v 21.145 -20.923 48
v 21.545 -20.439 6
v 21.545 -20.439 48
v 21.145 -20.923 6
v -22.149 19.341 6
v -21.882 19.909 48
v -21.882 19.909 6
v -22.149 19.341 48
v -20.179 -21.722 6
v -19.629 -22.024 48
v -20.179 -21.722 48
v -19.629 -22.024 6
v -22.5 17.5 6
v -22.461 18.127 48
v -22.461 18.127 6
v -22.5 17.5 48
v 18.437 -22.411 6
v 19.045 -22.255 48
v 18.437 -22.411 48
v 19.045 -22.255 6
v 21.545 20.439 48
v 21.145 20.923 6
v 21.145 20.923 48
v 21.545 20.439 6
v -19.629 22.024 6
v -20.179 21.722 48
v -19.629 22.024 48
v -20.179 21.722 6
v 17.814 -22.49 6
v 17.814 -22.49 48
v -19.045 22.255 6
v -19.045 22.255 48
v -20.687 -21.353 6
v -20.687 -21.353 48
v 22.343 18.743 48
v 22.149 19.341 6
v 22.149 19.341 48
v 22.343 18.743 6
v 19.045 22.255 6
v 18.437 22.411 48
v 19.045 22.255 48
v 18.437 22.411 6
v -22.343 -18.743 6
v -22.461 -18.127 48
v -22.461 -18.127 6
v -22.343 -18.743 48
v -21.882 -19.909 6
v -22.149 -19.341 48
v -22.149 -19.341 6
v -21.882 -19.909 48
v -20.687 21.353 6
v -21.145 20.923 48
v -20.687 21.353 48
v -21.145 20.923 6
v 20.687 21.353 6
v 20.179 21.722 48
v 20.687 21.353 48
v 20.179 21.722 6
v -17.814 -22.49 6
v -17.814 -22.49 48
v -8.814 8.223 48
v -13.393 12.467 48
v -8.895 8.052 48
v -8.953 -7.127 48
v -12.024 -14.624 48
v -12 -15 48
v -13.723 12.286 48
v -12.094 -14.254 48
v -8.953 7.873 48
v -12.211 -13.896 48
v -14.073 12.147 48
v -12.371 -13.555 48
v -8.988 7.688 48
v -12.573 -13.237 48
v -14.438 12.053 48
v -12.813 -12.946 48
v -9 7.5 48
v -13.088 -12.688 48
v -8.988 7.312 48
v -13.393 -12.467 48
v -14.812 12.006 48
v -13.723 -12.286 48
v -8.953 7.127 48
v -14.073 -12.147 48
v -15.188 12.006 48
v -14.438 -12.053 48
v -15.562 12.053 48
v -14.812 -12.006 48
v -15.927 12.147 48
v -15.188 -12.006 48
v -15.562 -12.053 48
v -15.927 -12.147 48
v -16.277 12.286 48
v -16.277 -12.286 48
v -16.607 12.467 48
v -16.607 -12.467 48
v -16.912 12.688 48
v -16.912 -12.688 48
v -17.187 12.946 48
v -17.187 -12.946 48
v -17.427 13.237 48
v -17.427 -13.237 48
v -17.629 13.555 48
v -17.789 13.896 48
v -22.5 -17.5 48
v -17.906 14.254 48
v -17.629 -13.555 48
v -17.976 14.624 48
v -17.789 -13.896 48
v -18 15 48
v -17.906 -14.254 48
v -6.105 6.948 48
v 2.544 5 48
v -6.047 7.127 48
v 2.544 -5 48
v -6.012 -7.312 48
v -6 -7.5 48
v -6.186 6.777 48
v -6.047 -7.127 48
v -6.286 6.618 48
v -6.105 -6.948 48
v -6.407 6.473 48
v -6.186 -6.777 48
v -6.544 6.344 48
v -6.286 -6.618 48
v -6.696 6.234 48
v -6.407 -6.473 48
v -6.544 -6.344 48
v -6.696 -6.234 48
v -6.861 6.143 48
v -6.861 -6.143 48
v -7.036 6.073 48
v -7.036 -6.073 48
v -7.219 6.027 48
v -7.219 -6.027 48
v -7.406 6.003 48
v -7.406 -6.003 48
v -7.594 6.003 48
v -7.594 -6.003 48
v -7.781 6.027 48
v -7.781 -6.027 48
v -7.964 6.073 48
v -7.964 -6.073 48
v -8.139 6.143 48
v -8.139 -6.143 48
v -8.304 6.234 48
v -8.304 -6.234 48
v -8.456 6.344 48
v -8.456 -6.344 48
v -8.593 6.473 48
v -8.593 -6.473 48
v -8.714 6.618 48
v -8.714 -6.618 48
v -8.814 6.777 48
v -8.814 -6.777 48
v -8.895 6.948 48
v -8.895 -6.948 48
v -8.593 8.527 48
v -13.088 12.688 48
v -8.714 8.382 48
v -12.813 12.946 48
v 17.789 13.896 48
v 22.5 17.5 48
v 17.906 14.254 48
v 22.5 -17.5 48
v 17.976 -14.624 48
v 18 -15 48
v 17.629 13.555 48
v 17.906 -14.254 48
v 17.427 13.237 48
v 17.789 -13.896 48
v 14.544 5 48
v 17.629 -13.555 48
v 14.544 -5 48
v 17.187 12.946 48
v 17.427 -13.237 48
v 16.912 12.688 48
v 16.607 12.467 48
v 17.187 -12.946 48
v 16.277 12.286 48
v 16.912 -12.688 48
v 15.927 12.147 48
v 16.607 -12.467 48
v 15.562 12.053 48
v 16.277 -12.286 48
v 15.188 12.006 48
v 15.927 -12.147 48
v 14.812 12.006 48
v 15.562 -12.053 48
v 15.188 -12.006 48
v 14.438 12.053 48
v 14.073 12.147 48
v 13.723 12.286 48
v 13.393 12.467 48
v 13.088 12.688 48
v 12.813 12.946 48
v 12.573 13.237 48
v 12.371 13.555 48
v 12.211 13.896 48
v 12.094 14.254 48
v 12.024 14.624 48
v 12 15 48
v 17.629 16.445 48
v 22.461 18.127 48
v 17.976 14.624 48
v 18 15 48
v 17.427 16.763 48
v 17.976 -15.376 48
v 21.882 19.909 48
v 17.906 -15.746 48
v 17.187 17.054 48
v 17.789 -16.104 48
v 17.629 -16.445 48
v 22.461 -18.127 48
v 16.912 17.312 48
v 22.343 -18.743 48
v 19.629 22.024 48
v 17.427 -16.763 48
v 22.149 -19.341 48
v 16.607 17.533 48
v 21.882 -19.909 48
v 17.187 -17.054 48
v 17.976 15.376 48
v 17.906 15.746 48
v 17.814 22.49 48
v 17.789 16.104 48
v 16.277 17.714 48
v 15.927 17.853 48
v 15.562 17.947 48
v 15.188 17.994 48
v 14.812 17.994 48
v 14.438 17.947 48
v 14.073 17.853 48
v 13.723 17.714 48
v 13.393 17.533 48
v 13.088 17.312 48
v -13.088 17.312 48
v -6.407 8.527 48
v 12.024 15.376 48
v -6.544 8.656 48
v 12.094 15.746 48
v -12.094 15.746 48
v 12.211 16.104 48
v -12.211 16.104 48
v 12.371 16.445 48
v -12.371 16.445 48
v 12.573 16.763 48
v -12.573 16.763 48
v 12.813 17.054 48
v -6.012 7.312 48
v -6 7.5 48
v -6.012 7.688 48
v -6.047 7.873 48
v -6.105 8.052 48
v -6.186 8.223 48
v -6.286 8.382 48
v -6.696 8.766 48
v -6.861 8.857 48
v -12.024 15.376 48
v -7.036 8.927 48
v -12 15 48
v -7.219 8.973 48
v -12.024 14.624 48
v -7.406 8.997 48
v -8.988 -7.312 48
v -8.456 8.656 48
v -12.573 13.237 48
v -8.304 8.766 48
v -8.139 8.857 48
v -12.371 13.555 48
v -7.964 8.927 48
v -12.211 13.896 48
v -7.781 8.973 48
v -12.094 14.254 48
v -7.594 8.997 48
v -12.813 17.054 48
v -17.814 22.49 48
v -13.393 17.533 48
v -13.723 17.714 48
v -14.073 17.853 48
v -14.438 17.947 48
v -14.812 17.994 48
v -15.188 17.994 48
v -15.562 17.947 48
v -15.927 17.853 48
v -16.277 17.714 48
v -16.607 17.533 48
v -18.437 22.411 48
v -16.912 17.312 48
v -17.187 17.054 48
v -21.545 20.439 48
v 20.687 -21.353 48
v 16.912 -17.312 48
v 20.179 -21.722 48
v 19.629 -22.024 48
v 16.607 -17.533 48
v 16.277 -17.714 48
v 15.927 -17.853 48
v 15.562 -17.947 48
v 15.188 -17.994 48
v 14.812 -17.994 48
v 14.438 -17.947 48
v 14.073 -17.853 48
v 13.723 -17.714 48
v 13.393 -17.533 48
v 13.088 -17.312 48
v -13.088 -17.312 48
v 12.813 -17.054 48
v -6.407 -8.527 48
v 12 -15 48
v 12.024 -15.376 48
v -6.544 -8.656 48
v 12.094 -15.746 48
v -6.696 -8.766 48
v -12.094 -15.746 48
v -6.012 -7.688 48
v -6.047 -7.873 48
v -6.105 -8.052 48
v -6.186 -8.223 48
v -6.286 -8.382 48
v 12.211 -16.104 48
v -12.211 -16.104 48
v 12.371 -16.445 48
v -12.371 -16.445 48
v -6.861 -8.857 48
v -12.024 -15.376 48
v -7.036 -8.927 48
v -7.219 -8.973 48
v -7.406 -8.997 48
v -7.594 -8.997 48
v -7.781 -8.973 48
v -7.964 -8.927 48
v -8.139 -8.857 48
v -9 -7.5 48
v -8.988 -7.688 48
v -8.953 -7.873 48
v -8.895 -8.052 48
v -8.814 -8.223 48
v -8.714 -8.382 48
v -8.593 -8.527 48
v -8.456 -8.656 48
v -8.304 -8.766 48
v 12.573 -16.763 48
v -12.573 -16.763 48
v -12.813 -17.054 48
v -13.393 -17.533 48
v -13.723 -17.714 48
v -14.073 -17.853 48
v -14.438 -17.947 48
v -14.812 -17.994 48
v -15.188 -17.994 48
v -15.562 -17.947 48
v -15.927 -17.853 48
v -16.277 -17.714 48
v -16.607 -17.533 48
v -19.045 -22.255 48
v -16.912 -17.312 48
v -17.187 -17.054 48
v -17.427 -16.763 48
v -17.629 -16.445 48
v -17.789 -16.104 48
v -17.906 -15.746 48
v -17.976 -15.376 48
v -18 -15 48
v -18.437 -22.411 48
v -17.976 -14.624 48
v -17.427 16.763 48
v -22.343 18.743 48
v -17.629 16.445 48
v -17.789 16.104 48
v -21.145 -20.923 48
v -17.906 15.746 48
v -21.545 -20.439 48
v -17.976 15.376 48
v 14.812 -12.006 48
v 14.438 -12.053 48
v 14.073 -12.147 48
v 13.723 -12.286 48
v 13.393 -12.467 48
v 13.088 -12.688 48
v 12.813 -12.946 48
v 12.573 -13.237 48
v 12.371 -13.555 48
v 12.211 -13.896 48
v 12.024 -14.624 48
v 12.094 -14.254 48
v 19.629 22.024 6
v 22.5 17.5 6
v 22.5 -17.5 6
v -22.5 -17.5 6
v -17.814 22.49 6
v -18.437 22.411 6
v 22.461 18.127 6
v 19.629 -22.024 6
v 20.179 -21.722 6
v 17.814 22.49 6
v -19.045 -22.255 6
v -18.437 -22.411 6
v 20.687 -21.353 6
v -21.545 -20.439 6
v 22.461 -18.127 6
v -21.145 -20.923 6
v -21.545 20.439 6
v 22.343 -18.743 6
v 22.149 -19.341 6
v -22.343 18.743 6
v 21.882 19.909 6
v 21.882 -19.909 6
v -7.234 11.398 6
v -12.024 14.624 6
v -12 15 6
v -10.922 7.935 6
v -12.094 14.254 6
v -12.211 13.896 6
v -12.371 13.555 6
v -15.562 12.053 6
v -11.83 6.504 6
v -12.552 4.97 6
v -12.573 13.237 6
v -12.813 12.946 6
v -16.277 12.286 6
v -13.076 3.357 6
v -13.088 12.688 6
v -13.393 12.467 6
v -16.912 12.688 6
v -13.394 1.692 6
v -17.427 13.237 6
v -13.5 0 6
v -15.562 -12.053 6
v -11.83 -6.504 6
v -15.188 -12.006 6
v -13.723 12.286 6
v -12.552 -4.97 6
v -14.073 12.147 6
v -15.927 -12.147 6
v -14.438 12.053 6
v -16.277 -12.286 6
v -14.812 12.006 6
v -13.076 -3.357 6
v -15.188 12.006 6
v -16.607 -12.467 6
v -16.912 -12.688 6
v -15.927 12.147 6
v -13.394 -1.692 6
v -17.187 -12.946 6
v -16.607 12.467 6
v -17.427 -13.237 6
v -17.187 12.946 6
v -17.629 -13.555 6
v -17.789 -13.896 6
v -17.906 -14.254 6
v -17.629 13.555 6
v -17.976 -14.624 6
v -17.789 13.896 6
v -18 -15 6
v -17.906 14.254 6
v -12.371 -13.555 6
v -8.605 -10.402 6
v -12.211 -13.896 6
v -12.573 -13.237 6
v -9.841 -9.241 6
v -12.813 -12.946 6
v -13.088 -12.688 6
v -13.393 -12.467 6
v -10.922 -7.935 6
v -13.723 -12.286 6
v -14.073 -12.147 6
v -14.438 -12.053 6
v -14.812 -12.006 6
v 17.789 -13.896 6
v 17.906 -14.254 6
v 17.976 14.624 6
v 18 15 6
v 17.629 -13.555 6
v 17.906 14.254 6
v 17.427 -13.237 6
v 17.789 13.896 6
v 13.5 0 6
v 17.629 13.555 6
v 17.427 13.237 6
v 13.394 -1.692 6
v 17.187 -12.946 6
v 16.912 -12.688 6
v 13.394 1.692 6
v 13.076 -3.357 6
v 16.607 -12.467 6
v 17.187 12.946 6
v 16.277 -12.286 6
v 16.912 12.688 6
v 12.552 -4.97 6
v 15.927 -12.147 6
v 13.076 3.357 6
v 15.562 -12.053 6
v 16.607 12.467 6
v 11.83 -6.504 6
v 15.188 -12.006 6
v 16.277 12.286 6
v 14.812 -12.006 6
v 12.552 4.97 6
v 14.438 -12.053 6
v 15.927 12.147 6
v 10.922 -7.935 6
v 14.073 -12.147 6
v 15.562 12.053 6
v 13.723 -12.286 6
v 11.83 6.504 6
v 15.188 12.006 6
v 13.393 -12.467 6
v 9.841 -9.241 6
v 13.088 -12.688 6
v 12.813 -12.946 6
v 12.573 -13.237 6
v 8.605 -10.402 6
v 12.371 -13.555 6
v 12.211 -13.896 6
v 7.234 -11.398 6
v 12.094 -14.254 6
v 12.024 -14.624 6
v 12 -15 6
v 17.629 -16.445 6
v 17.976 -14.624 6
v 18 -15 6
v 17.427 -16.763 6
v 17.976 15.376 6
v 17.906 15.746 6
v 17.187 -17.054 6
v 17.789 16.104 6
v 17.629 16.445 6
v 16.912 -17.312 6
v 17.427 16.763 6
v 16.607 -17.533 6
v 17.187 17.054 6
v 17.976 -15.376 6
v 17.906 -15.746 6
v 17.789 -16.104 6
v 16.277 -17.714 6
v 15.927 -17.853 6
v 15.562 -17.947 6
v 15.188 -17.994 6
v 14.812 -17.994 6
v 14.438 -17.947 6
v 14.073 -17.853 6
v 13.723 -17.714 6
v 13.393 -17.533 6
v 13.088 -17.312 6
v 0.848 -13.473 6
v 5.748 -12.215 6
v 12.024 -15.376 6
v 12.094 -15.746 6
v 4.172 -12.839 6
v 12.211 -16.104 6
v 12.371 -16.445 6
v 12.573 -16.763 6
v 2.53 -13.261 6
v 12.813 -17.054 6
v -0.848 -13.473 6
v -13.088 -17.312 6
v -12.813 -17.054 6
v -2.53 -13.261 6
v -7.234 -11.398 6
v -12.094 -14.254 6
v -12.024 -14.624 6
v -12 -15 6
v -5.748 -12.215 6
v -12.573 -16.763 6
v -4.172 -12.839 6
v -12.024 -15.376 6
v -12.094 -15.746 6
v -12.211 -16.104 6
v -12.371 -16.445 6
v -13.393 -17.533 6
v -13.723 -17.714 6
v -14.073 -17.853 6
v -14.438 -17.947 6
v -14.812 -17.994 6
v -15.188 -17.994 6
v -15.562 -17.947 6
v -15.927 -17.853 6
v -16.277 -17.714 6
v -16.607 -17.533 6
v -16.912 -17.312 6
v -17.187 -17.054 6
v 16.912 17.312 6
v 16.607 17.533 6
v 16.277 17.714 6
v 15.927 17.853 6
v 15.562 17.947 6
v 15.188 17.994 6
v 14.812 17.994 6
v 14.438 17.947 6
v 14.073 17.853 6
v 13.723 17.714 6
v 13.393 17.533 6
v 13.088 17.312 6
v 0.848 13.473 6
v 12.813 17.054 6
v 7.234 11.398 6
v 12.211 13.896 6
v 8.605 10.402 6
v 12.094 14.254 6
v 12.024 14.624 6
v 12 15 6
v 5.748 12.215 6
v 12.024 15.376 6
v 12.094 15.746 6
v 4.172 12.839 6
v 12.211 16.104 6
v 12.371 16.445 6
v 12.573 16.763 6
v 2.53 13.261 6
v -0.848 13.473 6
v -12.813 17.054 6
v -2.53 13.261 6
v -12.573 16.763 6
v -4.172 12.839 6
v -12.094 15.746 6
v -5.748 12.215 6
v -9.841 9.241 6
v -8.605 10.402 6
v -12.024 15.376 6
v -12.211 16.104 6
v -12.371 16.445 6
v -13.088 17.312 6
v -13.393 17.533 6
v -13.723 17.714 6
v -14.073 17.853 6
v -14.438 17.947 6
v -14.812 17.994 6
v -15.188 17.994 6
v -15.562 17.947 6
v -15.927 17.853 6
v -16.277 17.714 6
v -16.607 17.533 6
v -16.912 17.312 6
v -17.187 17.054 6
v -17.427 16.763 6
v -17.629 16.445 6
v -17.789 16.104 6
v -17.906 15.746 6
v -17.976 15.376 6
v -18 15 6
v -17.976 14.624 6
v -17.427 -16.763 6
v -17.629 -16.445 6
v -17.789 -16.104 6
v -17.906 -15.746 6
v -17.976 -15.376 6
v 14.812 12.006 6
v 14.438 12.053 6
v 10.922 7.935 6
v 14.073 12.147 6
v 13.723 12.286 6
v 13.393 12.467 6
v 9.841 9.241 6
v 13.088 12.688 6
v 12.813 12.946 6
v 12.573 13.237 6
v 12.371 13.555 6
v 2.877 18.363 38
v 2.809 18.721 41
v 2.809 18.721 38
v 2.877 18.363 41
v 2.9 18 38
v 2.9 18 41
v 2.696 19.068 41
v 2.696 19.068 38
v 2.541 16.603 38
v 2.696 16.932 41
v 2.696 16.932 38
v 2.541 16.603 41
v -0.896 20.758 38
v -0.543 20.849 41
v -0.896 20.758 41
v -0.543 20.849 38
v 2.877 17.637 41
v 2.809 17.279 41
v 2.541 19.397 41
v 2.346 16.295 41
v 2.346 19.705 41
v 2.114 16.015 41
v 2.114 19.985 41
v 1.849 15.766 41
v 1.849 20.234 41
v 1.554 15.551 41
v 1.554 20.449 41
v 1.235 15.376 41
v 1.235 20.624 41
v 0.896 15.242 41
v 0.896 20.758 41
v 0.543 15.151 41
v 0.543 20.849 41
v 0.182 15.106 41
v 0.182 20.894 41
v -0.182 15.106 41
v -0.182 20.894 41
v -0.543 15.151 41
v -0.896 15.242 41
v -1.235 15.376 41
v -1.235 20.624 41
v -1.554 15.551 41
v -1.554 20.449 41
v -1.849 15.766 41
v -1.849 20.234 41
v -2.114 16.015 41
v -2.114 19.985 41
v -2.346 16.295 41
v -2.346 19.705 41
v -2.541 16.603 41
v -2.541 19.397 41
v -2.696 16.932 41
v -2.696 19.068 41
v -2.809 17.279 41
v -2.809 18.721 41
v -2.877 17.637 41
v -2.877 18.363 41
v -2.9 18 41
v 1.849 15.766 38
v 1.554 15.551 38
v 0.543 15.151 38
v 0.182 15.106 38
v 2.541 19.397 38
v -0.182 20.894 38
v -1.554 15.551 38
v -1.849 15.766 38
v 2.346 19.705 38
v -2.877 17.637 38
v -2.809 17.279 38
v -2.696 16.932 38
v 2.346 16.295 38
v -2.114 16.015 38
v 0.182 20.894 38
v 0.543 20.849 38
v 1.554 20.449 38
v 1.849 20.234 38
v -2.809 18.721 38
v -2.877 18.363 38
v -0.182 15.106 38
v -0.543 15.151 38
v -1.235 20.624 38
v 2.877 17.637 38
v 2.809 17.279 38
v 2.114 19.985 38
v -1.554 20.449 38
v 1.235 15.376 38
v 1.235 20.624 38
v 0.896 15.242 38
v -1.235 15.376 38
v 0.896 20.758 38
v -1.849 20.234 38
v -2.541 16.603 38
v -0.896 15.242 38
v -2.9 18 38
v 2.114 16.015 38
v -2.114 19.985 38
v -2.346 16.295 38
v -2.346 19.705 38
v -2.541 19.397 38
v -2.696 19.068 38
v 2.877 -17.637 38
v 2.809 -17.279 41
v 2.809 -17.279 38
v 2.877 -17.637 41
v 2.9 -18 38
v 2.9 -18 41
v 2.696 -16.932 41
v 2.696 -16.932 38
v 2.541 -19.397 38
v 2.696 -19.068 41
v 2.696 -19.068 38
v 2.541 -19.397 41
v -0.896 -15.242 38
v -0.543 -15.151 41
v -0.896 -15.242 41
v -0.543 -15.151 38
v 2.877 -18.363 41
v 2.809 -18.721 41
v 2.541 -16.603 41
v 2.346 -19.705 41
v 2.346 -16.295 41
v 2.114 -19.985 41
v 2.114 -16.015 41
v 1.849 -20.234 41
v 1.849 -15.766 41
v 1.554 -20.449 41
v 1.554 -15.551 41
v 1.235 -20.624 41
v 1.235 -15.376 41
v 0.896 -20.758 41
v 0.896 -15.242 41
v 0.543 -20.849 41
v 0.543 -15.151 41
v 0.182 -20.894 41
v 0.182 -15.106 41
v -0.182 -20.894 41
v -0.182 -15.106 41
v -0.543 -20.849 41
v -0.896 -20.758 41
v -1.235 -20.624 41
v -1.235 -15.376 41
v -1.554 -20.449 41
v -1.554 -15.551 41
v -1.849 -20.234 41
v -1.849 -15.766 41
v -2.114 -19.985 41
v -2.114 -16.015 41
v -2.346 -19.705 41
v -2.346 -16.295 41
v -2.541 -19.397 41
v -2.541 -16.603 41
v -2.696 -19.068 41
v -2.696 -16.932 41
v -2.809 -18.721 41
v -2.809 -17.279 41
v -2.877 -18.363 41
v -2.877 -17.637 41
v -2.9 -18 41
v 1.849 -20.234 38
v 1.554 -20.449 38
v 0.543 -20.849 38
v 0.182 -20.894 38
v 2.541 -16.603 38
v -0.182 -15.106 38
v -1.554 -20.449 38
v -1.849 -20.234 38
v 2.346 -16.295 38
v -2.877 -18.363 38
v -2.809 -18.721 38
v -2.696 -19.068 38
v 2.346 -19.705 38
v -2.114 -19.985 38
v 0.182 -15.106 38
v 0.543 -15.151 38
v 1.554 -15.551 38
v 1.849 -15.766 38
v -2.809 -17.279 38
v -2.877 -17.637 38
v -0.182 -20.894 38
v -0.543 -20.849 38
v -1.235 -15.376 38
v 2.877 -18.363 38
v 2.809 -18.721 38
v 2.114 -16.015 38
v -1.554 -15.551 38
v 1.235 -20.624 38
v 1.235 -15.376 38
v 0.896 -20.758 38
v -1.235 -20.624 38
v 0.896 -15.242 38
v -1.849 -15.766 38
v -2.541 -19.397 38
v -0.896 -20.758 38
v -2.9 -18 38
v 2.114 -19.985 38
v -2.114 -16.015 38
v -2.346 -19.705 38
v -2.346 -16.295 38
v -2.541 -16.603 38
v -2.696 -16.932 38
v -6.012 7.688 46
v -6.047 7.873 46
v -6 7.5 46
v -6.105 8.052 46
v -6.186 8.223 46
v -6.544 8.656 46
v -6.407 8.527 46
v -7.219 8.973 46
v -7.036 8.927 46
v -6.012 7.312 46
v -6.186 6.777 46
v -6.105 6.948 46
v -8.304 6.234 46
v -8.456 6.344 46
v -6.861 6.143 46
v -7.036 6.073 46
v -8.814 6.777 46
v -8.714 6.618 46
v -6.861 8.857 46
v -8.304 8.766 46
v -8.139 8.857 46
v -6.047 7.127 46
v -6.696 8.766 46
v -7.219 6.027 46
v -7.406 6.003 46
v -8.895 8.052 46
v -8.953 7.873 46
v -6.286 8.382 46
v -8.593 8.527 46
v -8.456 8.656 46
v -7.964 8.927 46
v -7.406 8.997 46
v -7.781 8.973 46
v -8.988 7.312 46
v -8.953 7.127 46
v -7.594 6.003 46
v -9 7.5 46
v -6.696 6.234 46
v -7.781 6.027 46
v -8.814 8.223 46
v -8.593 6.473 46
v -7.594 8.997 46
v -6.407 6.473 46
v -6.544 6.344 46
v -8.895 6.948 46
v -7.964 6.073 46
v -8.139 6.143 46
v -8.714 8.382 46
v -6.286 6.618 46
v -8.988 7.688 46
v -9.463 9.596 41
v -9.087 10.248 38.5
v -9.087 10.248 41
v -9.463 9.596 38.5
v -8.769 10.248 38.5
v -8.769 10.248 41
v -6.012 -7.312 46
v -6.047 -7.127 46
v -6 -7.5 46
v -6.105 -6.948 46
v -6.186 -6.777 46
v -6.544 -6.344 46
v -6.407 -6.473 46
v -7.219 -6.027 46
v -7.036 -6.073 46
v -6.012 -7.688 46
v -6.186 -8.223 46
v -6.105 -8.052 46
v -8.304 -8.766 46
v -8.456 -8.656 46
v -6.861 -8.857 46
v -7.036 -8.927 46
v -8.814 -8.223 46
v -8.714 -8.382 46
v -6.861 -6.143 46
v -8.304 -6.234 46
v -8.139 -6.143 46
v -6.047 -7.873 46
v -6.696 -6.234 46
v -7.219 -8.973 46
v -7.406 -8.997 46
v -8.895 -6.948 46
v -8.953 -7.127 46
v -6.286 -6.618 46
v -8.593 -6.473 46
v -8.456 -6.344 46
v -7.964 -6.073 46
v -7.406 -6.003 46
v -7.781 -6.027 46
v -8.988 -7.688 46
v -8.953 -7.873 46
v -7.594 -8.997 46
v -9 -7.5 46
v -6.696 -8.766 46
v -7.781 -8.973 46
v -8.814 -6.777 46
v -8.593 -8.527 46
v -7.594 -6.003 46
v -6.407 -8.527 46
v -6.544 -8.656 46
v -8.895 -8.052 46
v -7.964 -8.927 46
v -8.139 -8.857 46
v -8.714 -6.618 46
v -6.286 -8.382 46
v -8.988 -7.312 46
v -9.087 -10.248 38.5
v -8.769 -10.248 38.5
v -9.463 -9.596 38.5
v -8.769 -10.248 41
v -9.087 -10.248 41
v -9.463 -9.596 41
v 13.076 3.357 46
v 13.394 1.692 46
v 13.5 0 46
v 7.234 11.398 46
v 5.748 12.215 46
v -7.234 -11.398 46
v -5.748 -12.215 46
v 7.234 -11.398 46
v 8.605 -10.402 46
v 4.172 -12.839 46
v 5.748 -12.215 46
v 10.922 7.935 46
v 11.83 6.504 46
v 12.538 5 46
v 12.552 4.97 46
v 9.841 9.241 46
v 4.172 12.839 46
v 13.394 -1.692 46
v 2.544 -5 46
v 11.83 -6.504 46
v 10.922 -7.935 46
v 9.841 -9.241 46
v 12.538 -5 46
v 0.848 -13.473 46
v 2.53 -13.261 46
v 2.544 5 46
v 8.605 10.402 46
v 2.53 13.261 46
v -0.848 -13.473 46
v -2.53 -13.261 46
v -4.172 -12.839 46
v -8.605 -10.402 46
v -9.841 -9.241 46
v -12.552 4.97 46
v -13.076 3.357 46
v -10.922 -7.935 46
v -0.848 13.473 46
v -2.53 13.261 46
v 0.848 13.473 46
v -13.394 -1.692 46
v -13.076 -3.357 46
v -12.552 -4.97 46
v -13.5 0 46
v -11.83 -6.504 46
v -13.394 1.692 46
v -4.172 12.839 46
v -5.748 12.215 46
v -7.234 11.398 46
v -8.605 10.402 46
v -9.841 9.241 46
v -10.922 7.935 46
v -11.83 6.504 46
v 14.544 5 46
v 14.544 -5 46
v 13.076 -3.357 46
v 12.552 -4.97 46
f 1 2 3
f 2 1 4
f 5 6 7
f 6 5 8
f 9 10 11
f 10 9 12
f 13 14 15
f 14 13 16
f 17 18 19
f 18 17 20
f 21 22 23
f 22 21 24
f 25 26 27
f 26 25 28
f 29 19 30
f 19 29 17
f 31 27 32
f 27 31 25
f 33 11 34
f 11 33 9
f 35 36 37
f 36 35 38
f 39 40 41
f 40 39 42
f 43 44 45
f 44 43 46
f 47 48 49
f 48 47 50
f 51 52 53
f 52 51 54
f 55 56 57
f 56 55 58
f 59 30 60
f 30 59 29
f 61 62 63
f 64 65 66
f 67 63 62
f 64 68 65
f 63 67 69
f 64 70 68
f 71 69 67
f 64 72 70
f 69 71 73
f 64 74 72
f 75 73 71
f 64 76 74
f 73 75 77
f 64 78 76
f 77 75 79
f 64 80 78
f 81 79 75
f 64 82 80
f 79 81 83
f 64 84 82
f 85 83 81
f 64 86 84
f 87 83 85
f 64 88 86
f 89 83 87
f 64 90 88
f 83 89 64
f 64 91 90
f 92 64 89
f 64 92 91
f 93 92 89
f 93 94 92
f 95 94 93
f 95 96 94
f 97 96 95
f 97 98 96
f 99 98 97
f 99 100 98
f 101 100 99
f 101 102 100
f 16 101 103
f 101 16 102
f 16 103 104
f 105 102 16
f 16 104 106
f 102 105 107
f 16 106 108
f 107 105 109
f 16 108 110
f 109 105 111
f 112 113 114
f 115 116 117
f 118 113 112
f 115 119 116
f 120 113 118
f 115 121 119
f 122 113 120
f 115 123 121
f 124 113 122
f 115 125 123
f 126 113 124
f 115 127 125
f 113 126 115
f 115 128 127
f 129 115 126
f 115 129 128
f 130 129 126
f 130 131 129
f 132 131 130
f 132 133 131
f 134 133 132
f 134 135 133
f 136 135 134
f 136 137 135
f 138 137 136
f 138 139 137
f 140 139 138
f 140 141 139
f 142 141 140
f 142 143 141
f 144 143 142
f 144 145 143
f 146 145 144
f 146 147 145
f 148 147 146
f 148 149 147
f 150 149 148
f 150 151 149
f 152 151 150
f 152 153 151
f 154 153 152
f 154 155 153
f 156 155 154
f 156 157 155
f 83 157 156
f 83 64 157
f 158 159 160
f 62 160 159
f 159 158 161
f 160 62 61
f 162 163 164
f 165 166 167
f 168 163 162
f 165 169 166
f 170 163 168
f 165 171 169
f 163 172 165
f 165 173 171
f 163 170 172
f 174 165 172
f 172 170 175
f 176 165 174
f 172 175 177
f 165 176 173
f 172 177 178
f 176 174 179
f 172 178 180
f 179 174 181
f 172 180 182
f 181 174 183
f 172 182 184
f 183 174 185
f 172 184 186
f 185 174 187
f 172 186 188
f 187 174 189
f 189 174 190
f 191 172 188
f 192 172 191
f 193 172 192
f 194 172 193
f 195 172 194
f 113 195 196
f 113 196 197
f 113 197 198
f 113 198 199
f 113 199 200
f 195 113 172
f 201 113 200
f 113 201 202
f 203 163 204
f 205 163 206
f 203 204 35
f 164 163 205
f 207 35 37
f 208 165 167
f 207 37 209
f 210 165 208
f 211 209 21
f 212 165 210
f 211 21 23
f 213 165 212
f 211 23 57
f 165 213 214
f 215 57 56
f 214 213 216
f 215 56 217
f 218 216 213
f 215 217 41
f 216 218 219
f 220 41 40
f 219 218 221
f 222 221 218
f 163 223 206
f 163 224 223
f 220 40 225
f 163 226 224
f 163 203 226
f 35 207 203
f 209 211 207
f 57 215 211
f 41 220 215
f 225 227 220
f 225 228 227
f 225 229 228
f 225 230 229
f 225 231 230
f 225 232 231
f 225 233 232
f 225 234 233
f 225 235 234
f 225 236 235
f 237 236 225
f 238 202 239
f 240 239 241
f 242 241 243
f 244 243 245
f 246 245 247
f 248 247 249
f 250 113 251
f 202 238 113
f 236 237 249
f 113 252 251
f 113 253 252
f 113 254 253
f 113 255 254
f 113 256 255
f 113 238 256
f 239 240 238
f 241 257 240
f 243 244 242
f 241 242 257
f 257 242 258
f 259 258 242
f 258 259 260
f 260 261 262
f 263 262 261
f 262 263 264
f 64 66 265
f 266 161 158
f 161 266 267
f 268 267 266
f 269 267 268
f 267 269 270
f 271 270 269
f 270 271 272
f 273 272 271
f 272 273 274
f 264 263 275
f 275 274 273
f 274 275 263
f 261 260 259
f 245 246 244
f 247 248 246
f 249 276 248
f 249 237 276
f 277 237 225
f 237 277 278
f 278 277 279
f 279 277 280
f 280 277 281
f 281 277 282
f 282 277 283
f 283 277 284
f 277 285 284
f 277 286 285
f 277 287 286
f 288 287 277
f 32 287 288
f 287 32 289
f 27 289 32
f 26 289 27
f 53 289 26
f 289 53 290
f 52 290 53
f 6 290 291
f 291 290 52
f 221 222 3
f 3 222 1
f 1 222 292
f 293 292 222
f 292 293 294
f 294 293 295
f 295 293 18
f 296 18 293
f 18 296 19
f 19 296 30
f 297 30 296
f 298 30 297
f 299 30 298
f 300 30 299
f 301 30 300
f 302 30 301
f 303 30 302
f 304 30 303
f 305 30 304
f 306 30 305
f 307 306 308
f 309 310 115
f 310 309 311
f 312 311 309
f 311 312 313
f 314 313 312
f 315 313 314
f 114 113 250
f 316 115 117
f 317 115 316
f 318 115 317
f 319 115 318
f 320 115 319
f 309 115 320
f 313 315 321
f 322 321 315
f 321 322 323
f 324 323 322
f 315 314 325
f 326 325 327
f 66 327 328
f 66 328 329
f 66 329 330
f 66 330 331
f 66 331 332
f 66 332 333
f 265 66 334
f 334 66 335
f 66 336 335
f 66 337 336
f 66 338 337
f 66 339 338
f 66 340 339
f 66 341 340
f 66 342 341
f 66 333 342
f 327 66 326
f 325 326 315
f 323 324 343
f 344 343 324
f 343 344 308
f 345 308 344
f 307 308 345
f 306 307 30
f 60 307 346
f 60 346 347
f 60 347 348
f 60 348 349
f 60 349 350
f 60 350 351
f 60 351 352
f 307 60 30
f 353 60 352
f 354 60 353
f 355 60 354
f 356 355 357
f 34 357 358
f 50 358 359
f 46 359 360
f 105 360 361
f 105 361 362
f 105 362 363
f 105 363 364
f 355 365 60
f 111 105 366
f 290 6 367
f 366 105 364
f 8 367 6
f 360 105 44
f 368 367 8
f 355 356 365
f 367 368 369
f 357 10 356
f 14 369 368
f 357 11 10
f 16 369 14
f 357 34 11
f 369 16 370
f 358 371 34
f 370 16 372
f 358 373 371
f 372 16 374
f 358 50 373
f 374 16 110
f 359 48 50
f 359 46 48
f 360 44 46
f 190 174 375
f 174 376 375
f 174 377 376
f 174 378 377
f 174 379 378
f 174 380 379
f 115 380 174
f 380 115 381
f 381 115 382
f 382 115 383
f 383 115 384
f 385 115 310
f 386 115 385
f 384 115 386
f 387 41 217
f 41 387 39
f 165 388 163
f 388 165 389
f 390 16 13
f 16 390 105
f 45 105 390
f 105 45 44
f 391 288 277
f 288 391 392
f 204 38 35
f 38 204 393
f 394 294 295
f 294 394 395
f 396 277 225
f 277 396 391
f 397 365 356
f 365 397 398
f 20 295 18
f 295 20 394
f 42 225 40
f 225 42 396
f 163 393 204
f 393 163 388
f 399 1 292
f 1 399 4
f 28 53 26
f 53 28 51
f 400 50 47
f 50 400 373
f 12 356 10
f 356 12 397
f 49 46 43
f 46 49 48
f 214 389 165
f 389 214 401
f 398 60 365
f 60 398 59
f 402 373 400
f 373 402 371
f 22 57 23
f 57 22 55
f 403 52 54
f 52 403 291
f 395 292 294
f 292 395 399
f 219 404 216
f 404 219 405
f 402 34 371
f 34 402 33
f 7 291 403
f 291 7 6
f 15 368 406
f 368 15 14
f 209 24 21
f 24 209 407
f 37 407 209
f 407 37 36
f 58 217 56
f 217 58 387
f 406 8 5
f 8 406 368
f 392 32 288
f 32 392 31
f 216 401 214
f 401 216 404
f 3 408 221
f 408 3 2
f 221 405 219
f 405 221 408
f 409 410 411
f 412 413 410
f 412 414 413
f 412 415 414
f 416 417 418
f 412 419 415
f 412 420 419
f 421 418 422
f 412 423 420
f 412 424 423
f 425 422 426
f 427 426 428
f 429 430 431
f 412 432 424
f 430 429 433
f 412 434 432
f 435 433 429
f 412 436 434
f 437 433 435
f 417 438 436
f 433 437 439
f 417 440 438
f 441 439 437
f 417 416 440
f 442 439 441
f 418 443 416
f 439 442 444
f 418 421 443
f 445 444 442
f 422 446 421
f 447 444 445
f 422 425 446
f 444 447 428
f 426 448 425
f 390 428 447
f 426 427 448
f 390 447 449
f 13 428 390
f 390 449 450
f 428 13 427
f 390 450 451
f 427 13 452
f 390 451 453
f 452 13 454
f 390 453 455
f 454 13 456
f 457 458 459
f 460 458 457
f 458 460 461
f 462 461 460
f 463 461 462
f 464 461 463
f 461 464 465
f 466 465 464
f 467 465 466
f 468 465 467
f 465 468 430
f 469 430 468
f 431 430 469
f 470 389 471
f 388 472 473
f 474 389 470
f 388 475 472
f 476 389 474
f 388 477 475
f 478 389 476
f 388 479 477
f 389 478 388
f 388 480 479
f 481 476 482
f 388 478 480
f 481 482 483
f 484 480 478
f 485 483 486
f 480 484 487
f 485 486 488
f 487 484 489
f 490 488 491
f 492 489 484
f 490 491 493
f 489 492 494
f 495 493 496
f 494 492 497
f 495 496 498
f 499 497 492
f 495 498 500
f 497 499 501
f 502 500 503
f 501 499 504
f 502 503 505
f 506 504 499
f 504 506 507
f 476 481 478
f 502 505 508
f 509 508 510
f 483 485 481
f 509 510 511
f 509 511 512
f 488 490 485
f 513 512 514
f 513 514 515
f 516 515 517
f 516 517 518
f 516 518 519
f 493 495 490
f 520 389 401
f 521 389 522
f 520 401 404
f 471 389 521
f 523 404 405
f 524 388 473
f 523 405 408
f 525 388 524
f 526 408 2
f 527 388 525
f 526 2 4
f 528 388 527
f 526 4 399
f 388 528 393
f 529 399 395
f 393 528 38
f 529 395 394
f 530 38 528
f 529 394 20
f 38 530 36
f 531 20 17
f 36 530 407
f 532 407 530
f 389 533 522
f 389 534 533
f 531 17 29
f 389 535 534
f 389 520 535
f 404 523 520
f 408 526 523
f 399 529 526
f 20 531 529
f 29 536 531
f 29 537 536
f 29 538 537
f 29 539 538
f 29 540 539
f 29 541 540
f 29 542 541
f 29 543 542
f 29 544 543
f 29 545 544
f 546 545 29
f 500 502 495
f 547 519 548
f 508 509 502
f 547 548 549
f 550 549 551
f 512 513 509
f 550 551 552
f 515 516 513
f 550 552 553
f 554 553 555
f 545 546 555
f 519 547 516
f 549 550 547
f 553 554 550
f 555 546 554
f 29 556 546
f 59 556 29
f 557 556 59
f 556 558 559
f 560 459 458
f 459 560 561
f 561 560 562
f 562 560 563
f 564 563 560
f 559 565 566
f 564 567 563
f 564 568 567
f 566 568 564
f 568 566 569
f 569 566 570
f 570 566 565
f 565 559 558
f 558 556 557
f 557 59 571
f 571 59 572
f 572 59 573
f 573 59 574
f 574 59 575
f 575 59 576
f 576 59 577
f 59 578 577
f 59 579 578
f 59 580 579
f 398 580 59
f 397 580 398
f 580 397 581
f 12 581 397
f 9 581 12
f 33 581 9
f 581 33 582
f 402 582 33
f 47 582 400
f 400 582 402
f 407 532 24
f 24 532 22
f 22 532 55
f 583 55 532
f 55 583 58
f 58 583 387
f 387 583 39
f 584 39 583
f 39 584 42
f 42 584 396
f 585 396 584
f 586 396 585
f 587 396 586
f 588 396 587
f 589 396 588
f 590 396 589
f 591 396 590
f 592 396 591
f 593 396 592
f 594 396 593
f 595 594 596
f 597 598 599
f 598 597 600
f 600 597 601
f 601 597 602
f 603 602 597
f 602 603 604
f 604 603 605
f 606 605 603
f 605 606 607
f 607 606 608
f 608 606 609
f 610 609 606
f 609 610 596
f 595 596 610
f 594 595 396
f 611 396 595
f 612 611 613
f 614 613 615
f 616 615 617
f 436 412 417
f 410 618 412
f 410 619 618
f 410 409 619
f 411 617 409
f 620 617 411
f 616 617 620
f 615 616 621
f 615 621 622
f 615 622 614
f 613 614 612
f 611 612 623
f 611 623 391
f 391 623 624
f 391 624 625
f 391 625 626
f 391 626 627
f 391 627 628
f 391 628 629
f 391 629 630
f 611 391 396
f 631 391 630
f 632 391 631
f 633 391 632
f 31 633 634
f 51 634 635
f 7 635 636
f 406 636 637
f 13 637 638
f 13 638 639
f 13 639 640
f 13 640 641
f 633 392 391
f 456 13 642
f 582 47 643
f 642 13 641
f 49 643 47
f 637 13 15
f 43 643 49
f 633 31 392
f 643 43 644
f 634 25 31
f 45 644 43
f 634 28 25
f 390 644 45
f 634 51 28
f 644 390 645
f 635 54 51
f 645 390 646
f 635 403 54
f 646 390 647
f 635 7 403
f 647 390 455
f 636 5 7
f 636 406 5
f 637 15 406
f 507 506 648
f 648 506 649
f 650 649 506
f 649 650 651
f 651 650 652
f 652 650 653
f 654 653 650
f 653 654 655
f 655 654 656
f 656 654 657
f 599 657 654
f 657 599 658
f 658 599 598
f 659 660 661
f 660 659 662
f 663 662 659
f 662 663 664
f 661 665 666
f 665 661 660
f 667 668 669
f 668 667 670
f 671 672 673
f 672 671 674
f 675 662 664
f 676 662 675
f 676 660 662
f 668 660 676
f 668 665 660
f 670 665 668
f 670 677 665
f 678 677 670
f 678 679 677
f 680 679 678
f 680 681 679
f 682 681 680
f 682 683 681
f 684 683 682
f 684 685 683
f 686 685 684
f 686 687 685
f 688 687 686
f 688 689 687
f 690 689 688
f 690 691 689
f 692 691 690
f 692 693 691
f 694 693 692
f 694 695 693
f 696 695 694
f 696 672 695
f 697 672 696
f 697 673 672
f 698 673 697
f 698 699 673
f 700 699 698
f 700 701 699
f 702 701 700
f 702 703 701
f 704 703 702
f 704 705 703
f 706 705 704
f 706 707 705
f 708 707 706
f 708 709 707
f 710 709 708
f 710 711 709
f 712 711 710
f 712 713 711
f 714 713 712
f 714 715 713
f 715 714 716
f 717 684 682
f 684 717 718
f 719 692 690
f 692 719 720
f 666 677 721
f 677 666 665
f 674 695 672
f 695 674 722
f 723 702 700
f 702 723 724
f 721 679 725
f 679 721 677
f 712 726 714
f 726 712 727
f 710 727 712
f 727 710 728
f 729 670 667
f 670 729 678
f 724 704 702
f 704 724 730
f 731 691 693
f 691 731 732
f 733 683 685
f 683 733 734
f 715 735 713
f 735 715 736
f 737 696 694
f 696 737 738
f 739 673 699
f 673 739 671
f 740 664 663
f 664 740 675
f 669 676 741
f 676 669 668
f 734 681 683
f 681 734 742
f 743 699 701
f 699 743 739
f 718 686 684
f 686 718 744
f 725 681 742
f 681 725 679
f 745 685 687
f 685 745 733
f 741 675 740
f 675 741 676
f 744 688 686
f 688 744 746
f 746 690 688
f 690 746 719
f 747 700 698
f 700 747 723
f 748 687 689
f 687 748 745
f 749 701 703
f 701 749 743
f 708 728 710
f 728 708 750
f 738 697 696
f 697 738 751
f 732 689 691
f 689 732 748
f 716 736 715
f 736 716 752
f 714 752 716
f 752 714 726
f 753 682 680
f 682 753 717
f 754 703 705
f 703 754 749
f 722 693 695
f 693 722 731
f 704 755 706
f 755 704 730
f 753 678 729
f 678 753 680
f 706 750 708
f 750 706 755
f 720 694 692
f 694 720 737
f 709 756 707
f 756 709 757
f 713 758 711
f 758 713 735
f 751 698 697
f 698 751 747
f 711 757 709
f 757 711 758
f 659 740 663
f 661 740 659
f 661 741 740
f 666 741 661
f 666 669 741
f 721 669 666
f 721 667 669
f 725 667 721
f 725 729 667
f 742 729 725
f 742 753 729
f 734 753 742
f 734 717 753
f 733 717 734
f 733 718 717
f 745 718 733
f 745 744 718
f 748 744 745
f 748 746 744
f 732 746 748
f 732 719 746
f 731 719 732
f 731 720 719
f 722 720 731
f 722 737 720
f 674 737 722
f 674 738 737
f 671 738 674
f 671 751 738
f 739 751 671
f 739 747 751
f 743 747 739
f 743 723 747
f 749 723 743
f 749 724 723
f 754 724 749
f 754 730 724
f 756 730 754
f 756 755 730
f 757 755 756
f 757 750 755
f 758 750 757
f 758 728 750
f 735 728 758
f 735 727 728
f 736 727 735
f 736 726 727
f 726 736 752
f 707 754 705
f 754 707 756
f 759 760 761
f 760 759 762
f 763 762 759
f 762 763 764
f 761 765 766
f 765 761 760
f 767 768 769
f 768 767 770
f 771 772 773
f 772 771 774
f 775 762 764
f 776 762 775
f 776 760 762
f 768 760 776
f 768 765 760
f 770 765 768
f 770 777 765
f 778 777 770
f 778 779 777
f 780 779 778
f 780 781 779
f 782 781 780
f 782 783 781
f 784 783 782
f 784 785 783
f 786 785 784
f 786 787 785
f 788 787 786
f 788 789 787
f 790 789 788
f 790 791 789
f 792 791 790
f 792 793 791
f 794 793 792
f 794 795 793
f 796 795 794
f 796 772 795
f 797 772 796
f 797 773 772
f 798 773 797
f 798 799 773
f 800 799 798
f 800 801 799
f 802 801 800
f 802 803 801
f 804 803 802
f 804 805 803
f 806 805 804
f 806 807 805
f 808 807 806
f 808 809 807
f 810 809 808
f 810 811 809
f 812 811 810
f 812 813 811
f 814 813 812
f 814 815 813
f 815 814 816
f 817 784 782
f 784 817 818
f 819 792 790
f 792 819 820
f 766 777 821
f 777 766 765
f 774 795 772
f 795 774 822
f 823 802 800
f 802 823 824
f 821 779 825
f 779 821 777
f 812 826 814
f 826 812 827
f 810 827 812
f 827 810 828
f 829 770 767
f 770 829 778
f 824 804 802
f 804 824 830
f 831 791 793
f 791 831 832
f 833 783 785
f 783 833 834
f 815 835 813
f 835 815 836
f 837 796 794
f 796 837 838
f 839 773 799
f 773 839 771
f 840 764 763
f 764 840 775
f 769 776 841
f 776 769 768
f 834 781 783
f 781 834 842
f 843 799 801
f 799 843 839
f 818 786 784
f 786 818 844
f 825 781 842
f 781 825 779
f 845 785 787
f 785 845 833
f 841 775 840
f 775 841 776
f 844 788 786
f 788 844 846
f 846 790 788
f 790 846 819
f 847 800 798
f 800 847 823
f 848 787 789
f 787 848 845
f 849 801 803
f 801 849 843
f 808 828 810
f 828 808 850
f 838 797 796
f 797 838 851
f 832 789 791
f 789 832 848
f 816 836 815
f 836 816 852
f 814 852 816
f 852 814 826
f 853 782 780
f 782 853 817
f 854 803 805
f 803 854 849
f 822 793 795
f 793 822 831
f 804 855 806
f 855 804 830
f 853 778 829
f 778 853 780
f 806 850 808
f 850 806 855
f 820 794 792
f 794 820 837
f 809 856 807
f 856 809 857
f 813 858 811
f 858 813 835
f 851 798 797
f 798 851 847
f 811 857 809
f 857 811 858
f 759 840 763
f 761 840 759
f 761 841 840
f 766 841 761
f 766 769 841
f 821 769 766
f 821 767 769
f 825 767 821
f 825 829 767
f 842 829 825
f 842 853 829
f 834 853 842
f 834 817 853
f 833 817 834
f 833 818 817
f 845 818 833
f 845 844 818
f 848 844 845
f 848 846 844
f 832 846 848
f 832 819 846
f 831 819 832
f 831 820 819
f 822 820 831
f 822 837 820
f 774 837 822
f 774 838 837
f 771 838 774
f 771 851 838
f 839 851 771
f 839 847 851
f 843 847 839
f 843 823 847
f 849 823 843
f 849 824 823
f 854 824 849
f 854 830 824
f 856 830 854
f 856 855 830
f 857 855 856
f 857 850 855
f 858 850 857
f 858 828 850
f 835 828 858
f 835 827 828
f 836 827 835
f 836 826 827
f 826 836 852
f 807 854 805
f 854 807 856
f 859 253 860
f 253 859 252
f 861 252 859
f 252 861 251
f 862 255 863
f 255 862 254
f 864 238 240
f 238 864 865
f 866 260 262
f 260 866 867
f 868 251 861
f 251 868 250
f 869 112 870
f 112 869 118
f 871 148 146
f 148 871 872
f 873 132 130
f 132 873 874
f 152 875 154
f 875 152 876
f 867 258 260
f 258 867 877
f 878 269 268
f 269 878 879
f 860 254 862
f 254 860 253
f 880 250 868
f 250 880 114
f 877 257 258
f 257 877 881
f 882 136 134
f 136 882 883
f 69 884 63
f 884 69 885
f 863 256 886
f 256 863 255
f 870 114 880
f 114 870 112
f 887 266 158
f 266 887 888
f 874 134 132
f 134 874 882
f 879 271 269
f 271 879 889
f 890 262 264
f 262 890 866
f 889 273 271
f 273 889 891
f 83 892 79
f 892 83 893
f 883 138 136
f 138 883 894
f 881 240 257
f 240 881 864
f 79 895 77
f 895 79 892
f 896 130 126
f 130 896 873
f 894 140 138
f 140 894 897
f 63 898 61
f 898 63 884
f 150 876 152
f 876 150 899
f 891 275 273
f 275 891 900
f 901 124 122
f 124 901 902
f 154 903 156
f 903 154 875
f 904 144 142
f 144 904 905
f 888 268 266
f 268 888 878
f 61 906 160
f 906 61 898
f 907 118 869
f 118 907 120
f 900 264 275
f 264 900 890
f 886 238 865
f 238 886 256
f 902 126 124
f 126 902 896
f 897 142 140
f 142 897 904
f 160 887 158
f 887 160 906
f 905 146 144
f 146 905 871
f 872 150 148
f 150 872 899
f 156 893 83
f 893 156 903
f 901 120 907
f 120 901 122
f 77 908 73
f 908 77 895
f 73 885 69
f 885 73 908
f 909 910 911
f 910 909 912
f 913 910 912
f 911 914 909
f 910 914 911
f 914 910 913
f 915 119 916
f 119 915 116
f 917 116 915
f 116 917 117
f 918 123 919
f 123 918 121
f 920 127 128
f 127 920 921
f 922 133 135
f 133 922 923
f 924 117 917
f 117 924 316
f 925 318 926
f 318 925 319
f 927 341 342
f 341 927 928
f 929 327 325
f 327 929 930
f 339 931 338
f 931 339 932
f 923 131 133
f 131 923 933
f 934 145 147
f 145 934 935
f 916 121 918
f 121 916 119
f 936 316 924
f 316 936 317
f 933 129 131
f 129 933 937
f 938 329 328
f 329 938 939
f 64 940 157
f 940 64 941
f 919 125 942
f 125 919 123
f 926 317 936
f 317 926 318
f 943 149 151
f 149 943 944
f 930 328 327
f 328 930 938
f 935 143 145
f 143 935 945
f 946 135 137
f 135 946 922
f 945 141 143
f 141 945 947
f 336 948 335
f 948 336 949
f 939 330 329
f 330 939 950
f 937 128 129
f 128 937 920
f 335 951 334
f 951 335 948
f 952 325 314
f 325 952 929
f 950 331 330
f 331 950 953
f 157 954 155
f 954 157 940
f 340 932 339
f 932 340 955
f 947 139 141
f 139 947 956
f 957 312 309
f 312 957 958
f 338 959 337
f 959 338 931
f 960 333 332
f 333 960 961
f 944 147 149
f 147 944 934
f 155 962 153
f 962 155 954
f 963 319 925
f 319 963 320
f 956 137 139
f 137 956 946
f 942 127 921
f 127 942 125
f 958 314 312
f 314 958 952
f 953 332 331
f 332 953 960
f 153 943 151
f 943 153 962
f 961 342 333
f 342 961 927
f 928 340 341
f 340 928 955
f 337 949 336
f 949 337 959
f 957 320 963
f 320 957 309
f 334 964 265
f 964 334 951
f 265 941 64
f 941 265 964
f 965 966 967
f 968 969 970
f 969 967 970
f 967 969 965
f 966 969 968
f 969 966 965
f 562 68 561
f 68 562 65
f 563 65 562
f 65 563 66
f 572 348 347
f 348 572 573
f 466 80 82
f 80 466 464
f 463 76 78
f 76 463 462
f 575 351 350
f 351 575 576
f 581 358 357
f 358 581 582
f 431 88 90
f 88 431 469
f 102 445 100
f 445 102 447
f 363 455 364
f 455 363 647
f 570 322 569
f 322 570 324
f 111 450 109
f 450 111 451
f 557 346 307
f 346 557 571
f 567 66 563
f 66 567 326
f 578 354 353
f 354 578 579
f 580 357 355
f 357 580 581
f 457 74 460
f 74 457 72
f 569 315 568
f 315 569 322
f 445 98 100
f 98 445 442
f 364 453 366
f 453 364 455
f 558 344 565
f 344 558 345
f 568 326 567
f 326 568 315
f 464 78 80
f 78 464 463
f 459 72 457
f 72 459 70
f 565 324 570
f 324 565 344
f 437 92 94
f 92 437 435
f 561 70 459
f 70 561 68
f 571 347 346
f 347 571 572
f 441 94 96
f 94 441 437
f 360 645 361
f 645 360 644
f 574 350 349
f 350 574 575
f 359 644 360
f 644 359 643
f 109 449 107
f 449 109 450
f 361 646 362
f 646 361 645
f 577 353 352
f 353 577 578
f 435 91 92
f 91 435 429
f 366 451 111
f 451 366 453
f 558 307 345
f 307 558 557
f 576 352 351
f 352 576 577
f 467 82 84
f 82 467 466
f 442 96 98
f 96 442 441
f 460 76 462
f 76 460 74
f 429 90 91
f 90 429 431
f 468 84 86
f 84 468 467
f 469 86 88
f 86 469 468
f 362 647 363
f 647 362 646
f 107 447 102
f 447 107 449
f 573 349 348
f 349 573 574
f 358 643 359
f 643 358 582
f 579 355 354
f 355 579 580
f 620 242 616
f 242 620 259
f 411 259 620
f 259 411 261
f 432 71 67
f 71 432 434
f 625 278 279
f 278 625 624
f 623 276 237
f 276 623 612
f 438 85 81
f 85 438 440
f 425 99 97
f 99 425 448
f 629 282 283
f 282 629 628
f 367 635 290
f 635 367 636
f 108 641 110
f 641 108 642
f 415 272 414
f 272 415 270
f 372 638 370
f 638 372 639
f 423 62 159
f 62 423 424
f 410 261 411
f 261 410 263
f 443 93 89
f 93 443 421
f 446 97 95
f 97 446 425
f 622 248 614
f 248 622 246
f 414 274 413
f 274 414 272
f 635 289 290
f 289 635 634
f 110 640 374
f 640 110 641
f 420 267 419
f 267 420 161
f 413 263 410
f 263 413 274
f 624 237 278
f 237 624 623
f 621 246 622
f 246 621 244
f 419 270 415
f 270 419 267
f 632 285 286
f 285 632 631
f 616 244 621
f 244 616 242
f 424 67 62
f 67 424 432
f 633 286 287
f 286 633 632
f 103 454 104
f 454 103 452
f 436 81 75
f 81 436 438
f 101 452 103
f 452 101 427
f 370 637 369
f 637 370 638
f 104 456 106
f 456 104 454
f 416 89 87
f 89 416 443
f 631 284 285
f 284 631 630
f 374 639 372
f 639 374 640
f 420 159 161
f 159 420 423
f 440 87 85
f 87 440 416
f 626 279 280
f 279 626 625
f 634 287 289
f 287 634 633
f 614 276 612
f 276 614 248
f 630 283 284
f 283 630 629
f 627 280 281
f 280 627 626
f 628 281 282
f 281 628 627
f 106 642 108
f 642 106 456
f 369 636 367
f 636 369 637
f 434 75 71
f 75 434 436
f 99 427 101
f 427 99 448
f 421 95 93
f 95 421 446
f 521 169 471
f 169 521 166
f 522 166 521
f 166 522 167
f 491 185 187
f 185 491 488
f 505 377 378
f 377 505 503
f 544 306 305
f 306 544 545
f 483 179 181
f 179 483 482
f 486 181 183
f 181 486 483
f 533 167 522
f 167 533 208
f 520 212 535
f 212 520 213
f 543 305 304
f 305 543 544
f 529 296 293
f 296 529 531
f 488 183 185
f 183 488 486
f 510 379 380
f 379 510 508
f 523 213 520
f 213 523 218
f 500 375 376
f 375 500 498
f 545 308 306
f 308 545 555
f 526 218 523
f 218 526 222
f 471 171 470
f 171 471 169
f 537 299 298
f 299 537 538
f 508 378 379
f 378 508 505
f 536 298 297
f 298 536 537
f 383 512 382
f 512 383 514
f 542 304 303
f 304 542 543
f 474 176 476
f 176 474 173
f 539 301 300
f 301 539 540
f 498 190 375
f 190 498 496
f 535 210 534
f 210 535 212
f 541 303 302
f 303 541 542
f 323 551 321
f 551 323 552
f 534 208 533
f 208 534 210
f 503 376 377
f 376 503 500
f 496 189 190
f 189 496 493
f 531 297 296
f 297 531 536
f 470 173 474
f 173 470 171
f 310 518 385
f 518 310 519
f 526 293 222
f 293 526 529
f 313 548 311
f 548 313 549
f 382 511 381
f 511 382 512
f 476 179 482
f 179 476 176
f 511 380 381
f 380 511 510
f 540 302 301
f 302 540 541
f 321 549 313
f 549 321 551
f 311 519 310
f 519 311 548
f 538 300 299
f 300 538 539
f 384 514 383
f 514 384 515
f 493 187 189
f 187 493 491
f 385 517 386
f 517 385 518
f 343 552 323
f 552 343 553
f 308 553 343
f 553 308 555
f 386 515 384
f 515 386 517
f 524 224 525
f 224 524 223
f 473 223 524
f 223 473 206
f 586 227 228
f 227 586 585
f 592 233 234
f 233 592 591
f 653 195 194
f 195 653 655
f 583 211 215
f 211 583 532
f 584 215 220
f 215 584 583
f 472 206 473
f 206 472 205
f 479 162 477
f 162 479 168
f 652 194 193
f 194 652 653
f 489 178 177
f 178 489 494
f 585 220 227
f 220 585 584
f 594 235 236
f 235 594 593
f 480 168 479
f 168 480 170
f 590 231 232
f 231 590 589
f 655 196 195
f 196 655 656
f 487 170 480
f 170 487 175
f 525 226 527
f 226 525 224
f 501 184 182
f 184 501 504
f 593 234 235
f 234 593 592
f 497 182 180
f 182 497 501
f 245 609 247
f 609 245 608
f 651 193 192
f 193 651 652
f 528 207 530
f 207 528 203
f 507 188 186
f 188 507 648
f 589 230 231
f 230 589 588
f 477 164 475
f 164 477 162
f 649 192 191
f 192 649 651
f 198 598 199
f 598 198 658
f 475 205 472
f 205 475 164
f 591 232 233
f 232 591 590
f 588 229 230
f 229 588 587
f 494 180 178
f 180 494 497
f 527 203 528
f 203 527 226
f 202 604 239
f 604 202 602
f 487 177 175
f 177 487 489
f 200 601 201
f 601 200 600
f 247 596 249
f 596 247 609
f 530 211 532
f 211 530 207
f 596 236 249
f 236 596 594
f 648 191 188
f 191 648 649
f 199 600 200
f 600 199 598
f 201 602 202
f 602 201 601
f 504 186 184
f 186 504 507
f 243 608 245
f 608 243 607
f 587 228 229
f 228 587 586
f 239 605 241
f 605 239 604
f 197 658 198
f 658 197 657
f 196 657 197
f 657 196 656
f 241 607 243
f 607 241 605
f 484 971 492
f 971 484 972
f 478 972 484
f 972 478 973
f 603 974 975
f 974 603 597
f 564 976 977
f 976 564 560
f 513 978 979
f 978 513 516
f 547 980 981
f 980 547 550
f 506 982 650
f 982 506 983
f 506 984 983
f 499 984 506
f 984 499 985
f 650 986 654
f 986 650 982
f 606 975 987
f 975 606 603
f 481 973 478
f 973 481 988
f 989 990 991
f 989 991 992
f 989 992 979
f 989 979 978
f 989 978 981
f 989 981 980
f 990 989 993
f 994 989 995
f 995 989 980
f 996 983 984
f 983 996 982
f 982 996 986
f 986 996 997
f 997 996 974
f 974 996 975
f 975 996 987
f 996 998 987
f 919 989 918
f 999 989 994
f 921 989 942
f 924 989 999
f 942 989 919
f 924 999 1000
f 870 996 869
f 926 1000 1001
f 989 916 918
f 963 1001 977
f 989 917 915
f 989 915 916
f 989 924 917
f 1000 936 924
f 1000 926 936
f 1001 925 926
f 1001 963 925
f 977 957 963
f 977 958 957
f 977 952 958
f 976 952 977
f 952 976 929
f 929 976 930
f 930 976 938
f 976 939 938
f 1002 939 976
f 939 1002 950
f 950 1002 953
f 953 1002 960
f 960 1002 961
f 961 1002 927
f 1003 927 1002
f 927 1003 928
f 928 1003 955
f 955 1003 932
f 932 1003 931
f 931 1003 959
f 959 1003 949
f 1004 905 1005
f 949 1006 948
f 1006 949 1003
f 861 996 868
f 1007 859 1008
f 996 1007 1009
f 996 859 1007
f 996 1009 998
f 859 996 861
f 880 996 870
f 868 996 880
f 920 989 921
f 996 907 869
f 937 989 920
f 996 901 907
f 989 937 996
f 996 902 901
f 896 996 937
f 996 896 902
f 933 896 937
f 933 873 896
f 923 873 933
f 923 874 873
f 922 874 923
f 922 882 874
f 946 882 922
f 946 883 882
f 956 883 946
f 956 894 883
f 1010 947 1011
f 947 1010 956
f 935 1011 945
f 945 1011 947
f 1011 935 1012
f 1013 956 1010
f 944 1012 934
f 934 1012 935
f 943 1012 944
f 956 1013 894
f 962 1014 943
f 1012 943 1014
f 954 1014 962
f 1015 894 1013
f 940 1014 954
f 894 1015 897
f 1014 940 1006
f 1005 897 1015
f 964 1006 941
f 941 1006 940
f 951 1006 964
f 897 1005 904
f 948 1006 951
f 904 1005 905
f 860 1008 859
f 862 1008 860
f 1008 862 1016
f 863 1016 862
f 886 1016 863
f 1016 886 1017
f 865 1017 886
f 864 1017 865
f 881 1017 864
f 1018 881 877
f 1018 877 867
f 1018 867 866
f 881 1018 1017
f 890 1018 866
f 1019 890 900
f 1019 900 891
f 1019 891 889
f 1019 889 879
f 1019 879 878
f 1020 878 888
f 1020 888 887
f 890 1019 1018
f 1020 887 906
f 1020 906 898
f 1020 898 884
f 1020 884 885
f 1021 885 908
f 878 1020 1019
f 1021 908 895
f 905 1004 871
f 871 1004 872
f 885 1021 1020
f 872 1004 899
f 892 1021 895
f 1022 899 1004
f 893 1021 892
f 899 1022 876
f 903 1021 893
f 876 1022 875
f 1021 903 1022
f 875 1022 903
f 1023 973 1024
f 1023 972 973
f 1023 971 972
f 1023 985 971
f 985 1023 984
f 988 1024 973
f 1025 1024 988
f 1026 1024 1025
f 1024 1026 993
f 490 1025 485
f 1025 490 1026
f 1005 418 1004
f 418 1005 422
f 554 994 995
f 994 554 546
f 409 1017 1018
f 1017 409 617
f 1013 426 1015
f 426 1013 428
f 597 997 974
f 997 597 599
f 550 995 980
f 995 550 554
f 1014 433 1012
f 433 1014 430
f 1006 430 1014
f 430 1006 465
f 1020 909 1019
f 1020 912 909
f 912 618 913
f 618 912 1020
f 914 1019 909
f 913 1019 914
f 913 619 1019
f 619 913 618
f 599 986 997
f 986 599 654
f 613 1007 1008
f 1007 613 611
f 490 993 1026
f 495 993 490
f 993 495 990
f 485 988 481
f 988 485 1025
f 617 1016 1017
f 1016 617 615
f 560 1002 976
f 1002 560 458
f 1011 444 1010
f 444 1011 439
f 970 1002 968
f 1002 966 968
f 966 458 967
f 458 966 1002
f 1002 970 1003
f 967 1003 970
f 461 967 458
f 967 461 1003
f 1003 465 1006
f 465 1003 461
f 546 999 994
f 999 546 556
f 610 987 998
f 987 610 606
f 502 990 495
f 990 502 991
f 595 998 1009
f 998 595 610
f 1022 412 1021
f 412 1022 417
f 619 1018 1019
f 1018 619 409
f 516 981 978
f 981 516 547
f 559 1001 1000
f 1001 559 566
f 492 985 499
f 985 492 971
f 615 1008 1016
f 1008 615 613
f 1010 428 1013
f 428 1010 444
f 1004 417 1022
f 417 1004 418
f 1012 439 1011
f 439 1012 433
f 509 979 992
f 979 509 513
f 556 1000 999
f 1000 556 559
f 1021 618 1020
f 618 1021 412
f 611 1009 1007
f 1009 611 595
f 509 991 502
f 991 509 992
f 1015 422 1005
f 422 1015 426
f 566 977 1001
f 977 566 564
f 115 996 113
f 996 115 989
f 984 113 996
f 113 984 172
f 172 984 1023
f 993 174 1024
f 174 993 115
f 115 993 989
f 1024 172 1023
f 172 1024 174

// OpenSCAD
$fn = 50;


difference() {
	union() {
		translate(v = [0, 0, 6]) {
			hull() {
				translate(v = [-17.5000000000, 17.5000000000, 0]) {
					cylinder(h = 42, r = 5);
				}
				translate(v = [17.5000000000, 17.5000000000, 0]) {
					cylinder(h = 42, r = 5);
				}
				translate(v = [-17.5000000000, -17.5000000000, 0]) {
					cylinder(h = 42, r = 5);
				}
				translate(v = [17.5000000000, -17.5000000000, 0]) {
					cylinder(h = 42, r = 5);
				}
			}
		}
		translate(v = [0, 0, 6]) {
			hull() {
				translate(v = [-17.5000000000, 17.5000000000, 0]) {
					cylinder(h = 42, r = 5);
				}
				translate(v = [17.5000000000, 17.5000000000, 0]) {
					cylinder(h = 42, r = 5);
				}
				translate(v = [-17.5000000000, -17.5000000000, 0]) {
					cylinder(h = 42, r = 5);
				}
				translate(v = [17.5000000000, -17.5000000000, 0]) {
					cylinder(h = 42, r = 5);
				}
			}
		}
	}
	union() {
		translate(v = [0, 18, 38]) {
			rotate(a = [0, 0, 0]) {
				difference() {
					union() {
						translate(v = [0, 0, -350.0000000000]) {
							cylinder(h = 200, r = 1.5000000000);
						}
						translate(v = [0, 0, -350.0000000000]) {
							cylinder(h = 200, r = 1.8000000000);
						}
						cylinder(h = 3, r = 2.9000000000);
						translate(v = [0, 0, -350.0000000000]) {
							cylinder(h = 200, r = 1.5000000000);
						}
					}
					union();
				}
			}
		}
		translate(v = [0, -18, 38]) {
			rotate(a = [0, 0, 0]) {
				difference() {
					union() {
						translate(v = [0, 0, -350.0000000000]) {
							cylinder(h = 200, r = 1.5000000000);
						}
						translate(v = [0, 0, -350.0000000000]) {
							cylinder(h = 200, r = 1.8000000000);
						}
						cylinder(h = 3, r = 2.9000000000);
						translate(v = [0, 0, -350.0000000000]) {
							cylinder(h = 200, r = 1.5000000000);
						}
					}
					union();
				}
			}
		}
		translate(v = [-7.5000000000, 7.5000000000, 41]) {
			rotate(a = [0, 0, 0]) {
				difference() {
					union() {
						translate(v = [0, 0, -100.0000000000]) {
							cylinder(h = 200, r = 1.5000000000);
						}
						translate(v = [0, 0, -100.0000000000]) {
							cylinder(h = 200, r = 1.5000000000);
						}
						translate(v = [0, 0, -2.5000000000]) {
							linear_extrude(height = 2.5000000000) {
								polygon(points = [[3.1735000000, 0.0000000000], [1.5867500000, 2.7483316189], [-1.5867500000, 2.7483316189], [-3.1735000000, 0.0000000000], [-1.5867500000, -2.7483316189], [1.5867500000, -2.7483316189]]);
							}
						}
						translate(v = [0, 0, -100.0000000000]) {
							cylinder(h = 200, r = 1.5000000000);
						}
					}
					union();
				}
			}
		}
		translate(v = [-7.5000000000, -7.5000000000, 41]) {
			rotate(a = [0, 0, 0]) {
				difference() {
					union() {
						translate(v = [0, 0, -100.0000000000]) {
							cylinder(h = 200, r = 1.5000000000);
						}
						translate(v = [0, 0, -100.0000000000]) {
							cylinder(h = 200, r = 1.5000000000);
						}
						translate(v = [0, 0, -2.5000000000]) {
							linear_extrude(height = 2.5000000000) {
								polygon(points = [[3.1735000000, 0.0000000000], [1.5867500000, 2.7483316189], [-1.5867500000, 2.7483316189], [-3.1735000000, 0.0000000000], [-1.5867500000, -2.7483316189], [1.5867500000, -2.7483316189]]);
							}
						}
						translate(v = [0, 0, -100.0000000000]) {
							cylinder(h = 200, r = 1.5000000000);
						}
					}
					union();
				}
			}
		}
		translate(v = [-15.0000000000, -15.0000000000, -100.0000000000]) {
			cylinder(h = 200, r = 3.0000000000);
		}
		translate(v = [-15.0000000000, 15.0000000000, -100.0000000000]) {
			cylinder(h = 200, r = 3.0000000000);
		}
		translate(v = [15.0000000000, -15.0000000000, -100.0000000000]) {
			cylinder(h = 200, r = 3.0000000000);
		}
		translate(v = [15.0000000000, 15.0000000000, -100.0000000000]) {
			cylinder(h = 200, r = 3.0000000000);
		}
		translate(v = [0, 0, -1.0000000000]) {
			cylinder(h = 47, r = 13.5000000000);
		}
		#translate(v = [2.5440000000, -5.0000000000, 46]) {
			cube(size = [7, 10, 10]);
		}
		#translate(v = [7.5440000000, -5.0000000000, 46]) {
			cube(size = [7, 10, 10]);
		}
	}
}
